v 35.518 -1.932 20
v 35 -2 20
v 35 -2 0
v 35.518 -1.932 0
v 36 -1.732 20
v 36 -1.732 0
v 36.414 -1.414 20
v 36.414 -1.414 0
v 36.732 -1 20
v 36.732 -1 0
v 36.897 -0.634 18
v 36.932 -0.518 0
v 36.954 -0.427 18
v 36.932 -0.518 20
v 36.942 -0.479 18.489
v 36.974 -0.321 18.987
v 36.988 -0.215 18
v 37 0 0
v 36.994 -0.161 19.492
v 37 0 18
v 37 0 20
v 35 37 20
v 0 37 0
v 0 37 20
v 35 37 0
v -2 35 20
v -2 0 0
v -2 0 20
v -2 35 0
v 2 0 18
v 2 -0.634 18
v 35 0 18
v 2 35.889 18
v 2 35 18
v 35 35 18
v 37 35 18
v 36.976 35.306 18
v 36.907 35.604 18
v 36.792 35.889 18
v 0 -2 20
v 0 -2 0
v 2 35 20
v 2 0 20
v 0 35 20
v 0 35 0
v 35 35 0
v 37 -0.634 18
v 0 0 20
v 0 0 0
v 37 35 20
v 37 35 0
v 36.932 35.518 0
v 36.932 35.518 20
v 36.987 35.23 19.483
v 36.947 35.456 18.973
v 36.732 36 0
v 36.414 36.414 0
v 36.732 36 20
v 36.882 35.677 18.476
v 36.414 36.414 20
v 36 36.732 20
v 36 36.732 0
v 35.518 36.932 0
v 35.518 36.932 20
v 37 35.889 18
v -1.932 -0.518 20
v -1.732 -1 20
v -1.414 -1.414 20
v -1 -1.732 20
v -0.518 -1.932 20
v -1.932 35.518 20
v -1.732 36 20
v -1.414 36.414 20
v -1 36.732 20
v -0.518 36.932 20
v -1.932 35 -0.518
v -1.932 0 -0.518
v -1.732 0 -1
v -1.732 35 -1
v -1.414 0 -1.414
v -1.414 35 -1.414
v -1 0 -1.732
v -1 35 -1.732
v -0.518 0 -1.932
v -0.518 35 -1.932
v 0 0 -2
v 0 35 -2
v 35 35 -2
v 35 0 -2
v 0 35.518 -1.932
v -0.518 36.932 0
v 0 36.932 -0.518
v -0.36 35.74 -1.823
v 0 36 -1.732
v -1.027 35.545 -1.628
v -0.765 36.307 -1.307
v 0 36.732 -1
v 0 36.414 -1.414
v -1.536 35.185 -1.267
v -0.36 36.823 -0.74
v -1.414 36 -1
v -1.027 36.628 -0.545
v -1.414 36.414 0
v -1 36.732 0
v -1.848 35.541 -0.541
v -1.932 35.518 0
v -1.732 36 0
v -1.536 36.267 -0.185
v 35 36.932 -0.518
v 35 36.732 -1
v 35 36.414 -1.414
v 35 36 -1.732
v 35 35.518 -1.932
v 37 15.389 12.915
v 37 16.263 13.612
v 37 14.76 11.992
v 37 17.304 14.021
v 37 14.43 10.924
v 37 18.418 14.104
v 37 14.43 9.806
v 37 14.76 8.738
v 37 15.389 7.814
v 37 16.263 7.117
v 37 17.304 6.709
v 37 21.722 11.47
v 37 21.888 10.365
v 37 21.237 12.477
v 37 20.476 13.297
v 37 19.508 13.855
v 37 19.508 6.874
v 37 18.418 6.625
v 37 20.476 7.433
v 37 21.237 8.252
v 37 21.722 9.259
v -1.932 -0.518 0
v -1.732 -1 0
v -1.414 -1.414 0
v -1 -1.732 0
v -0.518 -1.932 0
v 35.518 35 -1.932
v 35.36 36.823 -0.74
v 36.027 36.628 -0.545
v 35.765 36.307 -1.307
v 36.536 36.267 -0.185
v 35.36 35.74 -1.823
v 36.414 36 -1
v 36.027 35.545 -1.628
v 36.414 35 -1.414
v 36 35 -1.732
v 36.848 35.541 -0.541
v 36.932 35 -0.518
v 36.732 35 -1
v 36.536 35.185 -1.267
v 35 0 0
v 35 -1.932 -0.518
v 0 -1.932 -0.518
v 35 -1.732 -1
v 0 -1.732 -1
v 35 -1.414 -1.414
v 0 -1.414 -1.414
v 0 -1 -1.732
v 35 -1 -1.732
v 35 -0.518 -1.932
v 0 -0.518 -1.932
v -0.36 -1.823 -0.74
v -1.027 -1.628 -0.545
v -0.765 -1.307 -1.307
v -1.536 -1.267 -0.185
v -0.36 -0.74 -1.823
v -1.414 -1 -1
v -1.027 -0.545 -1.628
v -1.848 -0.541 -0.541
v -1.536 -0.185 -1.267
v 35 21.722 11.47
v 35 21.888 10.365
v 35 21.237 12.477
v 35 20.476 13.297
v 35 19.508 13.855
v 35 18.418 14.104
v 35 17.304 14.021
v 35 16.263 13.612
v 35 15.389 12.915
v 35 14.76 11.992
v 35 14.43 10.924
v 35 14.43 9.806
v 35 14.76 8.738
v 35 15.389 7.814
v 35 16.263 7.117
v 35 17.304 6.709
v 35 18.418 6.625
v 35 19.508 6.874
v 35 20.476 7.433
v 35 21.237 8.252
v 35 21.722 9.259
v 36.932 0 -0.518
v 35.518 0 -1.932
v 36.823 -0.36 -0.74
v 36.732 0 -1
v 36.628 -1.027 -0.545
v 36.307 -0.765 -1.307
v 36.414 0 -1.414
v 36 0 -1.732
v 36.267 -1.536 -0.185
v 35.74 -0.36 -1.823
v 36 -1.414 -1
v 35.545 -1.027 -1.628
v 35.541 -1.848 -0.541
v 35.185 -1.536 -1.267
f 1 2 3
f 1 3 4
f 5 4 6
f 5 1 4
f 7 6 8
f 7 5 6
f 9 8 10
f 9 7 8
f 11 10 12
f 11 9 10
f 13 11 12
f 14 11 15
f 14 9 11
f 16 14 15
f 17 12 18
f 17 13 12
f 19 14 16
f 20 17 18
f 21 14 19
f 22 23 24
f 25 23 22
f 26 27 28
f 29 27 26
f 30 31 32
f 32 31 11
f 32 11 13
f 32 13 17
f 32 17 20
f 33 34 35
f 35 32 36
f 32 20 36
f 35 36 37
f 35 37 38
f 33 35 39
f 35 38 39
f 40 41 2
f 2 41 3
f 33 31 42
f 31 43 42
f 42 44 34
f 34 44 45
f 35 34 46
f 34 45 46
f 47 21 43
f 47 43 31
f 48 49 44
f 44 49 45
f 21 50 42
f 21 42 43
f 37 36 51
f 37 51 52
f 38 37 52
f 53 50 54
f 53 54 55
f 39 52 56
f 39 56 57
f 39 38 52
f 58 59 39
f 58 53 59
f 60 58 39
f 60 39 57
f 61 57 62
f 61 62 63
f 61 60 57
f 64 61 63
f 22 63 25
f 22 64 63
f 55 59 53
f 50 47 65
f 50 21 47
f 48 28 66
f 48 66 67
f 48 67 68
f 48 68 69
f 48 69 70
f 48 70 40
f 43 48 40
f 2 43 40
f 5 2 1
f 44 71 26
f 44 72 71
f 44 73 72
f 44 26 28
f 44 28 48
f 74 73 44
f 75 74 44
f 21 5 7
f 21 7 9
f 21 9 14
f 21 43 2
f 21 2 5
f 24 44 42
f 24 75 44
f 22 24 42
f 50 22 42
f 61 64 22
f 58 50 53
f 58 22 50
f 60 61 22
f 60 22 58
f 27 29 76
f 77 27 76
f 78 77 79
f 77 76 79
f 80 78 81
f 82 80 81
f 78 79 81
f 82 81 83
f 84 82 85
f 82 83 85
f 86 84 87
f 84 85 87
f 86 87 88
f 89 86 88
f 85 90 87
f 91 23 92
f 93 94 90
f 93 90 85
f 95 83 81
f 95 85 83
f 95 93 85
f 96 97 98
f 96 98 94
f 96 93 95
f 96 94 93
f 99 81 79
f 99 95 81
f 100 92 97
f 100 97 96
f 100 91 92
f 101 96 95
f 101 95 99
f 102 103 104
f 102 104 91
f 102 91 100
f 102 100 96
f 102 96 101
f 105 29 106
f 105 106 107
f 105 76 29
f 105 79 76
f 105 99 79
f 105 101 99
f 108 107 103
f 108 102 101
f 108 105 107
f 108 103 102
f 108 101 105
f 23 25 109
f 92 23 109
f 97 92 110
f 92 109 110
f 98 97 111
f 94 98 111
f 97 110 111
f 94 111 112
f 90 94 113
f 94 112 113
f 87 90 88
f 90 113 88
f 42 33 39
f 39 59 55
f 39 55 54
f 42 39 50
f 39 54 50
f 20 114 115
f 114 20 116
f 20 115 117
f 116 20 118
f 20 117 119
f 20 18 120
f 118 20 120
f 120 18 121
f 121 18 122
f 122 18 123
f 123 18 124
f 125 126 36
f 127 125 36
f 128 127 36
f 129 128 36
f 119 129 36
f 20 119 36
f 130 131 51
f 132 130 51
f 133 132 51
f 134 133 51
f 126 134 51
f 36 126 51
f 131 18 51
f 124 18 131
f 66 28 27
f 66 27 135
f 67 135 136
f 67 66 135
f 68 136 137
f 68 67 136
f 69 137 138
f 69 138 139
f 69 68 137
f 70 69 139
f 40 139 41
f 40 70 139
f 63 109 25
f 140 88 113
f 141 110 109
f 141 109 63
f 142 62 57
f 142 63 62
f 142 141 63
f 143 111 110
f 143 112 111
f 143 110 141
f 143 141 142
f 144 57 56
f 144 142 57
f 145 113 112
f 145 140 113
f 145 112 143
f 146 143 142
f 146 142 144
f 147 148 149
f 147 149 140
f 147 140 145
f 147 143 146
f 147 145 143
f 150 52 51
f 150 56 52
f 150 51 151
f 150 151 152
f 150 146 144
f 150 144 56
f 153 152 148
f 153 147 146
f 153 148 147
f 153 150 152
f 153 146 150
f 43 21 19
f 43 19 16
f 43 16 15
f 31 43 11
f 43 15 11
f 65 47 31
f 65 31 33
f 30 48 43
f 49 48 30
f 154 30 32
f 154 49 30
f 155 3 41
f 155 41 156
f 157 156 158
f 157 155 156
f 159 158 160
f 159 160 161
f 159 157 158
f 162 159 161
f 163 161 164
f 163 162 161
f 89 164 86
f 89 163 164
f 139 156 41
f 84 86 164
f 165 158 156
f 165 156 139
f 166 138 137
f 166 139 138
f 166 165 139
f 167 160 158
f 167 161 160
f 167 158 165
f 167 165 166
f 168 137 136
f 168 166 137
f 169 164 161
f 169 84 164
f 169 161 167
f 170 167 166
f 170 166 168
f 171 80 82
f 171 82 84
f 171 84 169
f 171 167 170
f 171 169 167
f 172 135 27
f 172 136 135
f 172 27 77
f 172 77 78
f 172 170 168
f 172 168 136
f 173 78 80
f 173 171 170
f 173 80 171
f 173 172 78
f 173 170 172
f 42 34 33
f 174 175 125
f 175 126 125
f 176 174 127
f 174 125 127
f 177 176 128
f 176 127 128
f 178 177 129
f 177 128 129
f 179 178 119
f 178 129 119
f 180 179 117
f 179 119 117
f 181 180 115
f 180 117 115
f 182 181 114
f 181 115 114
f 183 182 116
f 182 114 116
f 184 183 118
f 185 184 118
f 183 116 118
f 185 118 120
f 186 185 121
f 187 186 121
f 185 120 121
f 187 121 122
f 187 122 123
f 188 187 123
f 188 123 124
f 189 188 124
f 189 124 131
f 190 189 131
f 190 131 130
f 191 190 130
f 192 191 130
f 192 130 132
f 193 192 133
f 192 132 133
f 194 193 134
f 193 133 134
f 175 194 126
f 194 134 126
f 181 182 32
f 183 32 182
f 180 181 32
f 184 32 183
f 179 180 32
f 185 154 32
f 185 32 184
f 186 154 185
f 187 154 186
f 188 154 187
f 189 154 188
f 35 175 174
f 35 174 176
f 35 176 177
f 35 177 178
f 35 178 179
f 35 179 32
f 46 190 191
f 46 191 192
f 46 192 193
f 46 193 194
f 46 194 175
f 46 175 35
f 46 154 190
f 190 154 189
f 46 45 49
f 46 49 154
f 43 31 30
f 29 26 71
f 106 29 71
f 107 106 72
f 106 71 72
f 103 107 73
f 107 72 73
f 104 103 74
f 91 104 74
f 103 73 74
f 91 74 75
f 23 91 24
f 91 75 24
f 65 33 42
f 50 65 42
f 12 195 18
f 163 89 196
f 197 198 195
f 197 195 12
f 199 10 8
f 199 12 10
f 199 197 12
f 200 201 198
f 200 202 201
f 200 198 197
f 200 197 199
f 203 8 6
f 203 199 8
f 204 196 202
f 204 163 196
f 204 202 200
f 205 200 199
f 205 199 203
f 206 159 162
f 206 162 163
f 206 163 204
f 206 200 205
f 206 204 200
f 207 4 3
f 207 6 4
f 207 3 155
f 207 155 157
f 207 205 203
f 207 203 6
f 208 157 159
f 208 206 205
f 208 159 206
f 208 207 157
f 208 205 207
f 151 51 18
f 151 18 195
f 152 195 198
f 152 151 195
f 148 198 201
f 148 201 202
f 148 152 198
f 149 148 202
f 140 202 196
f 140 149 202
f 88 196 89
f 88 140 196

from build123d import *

# Parameters (mm, degrees)
EXTRUDE002_DEPTH = 35
SKETCH001_R      = 3.75
EXTRUDE001_DEPTH = 2.25
BOX_W            = 35
BOX_H            = 35
BOX_DEPTH        = 20
THICKNESS_T      = 2


with BuildPart() as extrude002:
    # Sketch002 (on Face12 of Thickness) → Extrude002 (new body)
    with BuildSketch(Plane(origin=(37, 0, -15), x_dir=(0, 1, 0), z_dir=(1, 0, 0))):
        Polygon((-0.633947, 33), (35.88865, 33), (35, 35), (0, 35), align=None)
    extrude(amount=-EXTRUDE002_DEPTH)


with BuildPart() as cover:
    # Clone base: copy of Extrude002
    add(extrude002.part)


with BuildPart() as hole:
    # Sketch001 → Extrude001 (new body, symmetric)
    with BuildSketch(Plane.YZ.offset(37)):
        with Locations((18.13824, 10.364708)):
            Circle(SKETCH001_R)
    extrude(amount=EXTRUDE001_DEPTH, both=True)


with BuildPart() as finalbox:
    # Box → Box (new body)
    with BuildSketch(Plane.XY):
        with Locations((17.5, 17.5)):
            Rectangle(BOX_W, BOX_H)
    extrude(amount=BOX_DEPTH)

    # Thickness
    thickness_openings = [finalbox.faces().sort_by_distance(p)[0] for p in [
        (17.5, 17.5, 20),
    ]]
    offset(amount=THICKNESS_T, openings=thickness_openings)

    # Cut: cut hole
    add(hole.part, mode=Mode.SUBTRACT)

    # Cut001: cut Extrude002
    add(extrude002.part, mode=Mode.SUBTRACT)


solid = Compound([cover.part, finalbox.part])
